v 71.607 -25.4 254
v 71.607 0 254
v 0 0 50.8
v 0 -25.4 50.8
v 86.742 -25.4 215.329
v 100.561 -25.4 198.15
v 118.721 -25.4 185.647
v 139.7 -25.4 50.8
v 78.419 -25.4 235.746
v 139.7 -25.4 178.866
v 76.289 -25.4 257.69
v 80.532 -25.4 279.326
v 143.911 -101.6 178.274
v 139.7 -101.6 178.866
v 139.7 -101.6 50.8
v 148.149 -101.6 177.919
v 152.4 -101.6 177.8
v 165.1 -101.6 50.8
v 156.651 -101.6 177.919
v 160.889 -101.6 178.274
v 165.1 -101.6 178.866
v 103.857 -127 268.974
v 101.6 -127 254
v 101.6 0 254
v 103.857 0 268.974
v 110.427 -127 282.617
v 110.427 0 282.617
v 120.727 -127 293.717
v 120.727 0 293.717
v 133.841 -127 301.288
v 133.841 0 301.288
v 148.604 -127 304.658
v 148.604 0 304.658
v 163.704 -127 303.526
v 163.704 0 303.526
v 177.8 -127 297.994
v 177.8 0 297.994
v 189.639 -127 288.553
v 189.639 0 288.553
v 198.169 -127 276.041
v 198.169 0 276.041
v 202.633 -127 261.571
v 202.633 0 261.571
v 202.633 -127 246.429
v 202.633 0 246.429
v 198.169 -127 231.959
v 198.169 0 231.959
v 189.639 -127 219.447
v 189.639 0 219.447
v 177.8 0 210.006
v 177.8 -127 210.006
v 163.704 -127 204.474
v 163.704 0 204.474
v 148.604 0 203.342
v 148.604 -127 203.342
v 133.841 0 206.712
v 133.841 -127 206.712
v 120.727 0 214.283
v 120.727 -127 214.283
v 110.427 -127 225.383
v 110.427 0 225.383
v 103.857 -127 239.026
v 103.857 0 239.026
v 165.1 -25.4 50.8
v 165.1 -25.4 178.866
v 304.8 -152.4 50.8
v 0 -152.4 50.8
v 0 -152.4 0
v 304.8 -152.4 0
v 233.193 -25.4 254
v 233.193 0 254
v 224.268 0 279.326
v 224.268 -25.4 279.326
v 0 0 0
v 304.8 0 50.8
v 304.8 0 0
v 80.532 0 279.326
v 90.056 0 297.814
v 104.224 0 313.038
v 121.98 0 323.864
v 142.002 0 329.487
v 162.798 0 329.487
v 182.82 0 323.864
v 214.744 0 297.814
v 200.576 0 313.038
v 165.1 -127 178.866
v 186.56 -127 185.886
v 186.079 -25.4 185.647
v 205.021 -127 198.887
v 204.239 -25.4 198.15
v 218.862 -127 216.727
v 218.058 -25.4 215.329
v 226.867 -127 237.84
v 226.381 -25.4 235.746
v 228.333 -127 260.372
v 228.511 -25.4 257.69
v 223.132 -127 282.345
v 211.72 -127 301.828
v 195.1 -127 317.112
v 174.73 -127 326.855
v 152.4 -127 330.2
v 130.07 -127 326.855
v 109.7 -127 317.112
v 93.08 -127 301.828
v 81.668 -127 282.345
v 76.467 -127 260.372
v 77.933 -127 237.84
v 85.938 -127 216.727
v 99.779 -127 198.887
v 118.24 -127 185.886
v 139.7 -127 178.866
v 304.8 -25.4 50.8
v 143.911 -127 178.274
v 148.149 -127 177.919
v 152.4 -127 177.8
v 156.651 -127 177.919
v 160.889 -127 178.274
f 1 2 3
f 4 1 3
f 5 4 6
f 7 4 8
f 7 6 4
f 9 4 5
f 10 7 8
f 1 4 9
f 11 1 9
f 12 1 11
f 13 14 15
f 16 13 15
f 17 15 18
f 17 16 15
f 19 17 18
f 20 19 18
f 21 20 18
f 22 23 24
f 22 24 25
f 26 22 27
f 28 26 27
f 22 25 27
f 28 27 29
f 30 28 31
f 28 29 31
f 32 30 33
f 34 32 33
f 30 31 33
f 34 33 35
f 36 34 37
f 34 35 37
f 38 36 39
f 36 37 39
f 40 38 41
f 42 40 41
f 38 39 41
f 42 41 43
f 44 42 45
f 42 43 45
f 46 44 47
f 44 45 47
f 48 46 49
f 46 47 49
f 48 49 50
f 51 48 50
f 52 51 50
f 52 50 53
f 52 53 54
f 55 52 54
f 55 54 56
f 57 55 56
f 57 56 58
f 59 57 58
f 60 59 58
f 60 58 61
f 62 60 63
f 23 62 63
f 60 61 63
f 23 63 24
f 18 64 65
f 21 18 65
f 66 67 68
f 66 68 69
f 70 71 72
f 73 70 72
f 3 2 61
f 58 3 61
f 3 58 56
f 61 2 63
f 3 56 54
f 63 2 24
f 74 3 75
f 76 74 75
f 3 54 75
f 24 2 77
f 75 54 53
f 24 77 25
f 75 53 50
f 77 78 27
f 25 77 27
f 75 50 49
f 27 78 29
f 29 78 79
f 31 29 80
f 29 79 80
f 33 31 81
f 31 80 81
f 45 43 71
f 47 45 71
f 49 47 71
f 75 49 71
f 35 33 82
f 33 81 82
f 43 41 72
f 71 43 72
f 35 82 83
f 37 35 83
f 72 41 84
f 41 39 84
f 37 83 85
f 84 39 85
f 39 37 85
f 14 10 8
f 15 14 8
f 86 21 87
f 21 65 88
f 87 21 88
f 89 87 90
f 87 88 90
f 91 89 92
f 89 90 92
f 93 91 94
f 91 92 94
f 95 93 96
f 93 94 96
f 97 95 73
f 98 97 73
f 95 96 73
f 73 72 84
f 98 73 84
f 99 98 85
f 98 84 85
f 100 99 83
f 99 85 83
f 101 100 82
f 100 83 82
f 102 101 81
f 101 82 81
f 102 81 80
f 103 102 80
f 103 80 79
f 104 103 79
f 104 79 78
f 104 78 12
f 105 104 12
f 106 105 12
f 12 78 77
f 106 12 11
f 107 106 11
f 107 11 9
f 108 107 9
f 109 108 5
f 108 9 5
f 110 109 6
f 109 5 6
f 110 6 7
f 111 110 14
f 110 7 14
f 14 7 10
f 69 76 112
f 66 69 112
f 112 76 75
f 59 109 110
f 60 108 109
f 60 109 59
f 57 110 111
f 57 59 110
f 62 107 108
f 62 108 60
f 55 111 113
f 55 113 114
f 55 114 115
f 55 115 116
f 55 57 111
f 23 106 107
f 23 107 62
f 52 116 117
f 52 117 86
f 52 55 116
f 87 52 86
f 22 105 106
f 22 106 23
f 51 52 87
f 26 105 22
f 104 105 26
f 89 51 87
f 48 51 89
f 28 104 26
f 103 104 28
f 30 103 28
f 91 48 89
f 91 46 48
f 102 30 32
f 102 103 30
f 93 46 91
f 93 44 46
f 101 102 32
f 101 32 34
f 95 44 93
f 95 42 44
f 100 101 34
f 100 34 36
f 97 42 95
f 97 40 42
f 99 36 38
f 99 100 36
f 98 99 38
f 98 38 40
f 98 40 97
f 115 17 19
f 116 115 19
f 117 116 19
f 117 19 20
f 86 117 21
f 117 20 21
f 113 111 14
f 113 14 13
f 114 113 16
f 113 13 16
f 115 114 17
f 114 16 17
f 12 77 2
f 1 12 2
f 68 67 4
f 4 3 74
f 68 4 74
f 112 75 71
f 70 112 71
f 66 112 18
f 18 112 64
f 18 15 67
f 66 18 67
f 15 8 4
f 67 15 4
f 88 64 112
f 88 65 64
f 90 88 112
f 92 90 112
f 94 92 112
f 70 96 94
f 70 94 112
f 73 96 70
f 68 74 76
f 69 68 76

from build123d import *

# Parameters (mm, degrees)
F1_DEPTH = 152.4
F2_DEPTH = 25.4
F3_DEPTH = 101.6
F4_DEPTH = 127


with BuildPart() as f1:
    # F0 (on Front) → F1 (new body)
    with BuildSketch(Plane.XZ):
        Polygon((0, 50.8), (0, 0), (304.8, 0), (304.8, 50.8), (165.1, 50.8), (152.4, 50.8), (139.7, 50.8), align=None)
    extrude(amount=F1_DEPTH)

    # F0 (on Front) → F2 (join)
    with BuildSketch(Plane.XZ):
        with BuildLine():
            Line((165.1, 50.8), (304.8, 50.8))
            Line((304.8, 50.8), (233.192970397, 254))
            Line((233.192970397, 254), (228.6, 254))
            ThreePointArc((228.6, 254), (210.5987113259, 204.8131115032), (165.1, 178.8657867546))
            Line((165.1, 178.8657867546), (165.1, 50.8))
        make_face()
        with BuildLine():
            Line((71.607029603, 254), (0, 50.8))
            Line((0, 50.8), (139.7, 50.8))
            Line((139.7, 50.8), (139.7, 178.8657867546))
            ThreePointArc((139.7, 178.8657867546), (94.2012886741, 204.8131115032), (76.2, 254))
            Line((76.2, 254), (71.607029603, 254))
        make_face()
        with BuildLine():
            Line((80.5318662816, 279.3261002888), (71.607029603, 254))
            Line((71.607029603, 254), (76.2, 254))
            ThreePointArc((76.2, 254), (77.2907735716, 266.8469492616), (80.5318662816, 279.3261002888))
        make_face()
        with BuildLine():
            Line((228.6, 254), (233.192970397, 254))
            Line((233.192970397, 254), (224.2681337184, 279.3261002888))
            ThreePointArc((224.2681337184, 279.3261002888), (227.5092264284, 266.8469492616), (228.6, 254))
        make_face()
    extrude(amount=F2_DEPTH)

    # F0 (on Front) → F3 (join)
    with BuildSketch(Plane.XZ):
        with BuildLine():
            Line((152.4, 50.8), (165.1, 50.8))
            Line((165.1, 50.8), (165.1, 178.8657867546))
            ThreePointArc((165.1, 178.8657867546), (158.7723210333, 178.0669141635), (152.4, 177.8))
            Line((152.4, 177.8), (152.4, 50.8))
        make_face()
        with BuildLine():
            Line((139.7, 178.8657867546), (139.7, 50.8))
            Line((139.7, 50.8), (152.4, 50.8))
            Line((152.4, 50.8), (152.4, 177.8))
            ThreePointArc((152.4, 177.8), (146.0276789667, 178.0669141635), (139.7, 178.8657867546))
        make_face()
    extrude(amount=F3_DEPTH)

    # F0 (on Front) → F4 (join)
    with BuildSketch(Plane.XZ):
        with BuildLine():
            ThreePointArc((76.2, 254), (94.2012886741, 204.8131115032), (139.7, 178.8657867546))
            Line((139.7, 178.8657867546), (152.4, 178.8657867546))
            Line((152.4, 178.8657867546), (165.1, 178.8657867546))
            ThreePointArc((165.1, 178.8657867546), (210.5987113259, 204.8131115032), (228.6, 254))
            Line((228.6, 254), (203.2, 254))
            ThreePointArc((203.2, 254), (152.4, 203.2), (101.6, 254))
            Line((101.6, 254), (76.2, 254))
        make_face()
        with BuildLine():
            ThreePointArc((80.5318662816, 279.3261002888), (77.2907735716, 266.8469492616), (76.2, 254))
            Line((76.2, 254), (101.6, 254))
            ThreePointArc((101.6, 254), (152.4, 304.8), (203.2, 254))
            Line((203.2, 254), (228.6, 254))
            ThreePointArc((228.6, 254), (227.5092264284, 266.8469492616), (224.2681337184, 279.3261002888))
            ThreePointArc((224.2681337184, 279.3261002888), (152.4, 330.2), (80.5318662816, 279.3261002888))
        make_face()
        with BuildLine():
            Line((152.4, 178.8657867546), (139.7, 178.8657867546))
            ThreePointArc((139.7, 178.8657867546), (146.0276789667, 178.0669141635), (152.4, 177.8))
            Line((152.4, 177.8), (152.4, 178.8657867546))
        make_face()
        with BuildLine():
            ThreePointArc((152.4, 177.8), (158.7723210333, 178.0669141635), (165.1, 178.8657867546))
            Line((165.1, 178.8657867546), (152.4, 178.8657867546))
            Line((152.4, 178.8657867546), (152.4, 177.8))
        make_face()
    extrude(amount=F4_DEPTH)


solid = f1.part
